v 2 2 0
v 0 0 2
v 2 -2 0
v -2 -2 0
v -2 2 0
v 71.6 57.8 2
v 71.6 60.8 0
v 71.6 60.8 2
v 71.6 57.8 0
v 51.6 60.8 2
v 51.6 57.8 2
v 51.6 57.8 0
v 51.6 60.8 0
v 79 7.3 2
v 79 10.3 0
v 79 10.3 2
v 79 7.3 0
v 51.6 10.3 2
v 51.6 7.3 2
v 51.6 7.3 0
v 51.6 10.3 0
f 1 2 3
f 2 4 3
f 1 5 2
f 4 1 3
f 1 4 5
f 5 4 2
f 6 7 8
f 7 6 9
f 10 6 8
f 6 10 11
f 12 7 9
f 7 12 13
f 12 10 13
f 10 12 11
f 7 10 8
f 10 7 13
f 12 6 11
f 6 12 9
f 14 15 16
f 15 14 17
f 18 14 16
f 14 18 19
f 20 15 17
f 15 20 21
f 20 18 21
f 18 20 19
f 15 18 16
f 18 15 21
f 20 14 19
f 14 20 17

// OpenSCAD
module nailhole(pos) {
	color("Blue", 0.5) 
	translate(pos) {
		translate ([0,0,-5]) cylinder(h=20, r=2, $fn=12);
		translate ([0,0,9]) cylinder(h=3, r=4, $fn=20);
	}
}

module number(b) {
	minkowski() {
		linear_extrude(height = 8) import("20.dxf", center=true);
		polyhedron(
			points=[[b,b,0],[b,-b,0],[-b,-b,0],[-b,b,0],
           [0,0,b]],
			triangles=[ [0,1,4],[1,2,4],[2,3,4],[3,0,4], // each triangle side
              [1,0,3],[2,1,3] ] // two triangles for square base
		);
	}
}

difference() {
	union() {
		number(2);
		/* Sprue to hold the numbers aligned */
		translate([51.6,57.8,0]) cube([20,3,2]);
		translate([51.6, 7.3, 0]) cube([27.4, 3, 2]);
	}
	nailhole([25, 8.7, 0]);
	nailhole([41.5, 71.4, 0]);
	nailhole([76.7, 43.5, 0]);
	nailhole([116.2, 43.5, 0]);
}
